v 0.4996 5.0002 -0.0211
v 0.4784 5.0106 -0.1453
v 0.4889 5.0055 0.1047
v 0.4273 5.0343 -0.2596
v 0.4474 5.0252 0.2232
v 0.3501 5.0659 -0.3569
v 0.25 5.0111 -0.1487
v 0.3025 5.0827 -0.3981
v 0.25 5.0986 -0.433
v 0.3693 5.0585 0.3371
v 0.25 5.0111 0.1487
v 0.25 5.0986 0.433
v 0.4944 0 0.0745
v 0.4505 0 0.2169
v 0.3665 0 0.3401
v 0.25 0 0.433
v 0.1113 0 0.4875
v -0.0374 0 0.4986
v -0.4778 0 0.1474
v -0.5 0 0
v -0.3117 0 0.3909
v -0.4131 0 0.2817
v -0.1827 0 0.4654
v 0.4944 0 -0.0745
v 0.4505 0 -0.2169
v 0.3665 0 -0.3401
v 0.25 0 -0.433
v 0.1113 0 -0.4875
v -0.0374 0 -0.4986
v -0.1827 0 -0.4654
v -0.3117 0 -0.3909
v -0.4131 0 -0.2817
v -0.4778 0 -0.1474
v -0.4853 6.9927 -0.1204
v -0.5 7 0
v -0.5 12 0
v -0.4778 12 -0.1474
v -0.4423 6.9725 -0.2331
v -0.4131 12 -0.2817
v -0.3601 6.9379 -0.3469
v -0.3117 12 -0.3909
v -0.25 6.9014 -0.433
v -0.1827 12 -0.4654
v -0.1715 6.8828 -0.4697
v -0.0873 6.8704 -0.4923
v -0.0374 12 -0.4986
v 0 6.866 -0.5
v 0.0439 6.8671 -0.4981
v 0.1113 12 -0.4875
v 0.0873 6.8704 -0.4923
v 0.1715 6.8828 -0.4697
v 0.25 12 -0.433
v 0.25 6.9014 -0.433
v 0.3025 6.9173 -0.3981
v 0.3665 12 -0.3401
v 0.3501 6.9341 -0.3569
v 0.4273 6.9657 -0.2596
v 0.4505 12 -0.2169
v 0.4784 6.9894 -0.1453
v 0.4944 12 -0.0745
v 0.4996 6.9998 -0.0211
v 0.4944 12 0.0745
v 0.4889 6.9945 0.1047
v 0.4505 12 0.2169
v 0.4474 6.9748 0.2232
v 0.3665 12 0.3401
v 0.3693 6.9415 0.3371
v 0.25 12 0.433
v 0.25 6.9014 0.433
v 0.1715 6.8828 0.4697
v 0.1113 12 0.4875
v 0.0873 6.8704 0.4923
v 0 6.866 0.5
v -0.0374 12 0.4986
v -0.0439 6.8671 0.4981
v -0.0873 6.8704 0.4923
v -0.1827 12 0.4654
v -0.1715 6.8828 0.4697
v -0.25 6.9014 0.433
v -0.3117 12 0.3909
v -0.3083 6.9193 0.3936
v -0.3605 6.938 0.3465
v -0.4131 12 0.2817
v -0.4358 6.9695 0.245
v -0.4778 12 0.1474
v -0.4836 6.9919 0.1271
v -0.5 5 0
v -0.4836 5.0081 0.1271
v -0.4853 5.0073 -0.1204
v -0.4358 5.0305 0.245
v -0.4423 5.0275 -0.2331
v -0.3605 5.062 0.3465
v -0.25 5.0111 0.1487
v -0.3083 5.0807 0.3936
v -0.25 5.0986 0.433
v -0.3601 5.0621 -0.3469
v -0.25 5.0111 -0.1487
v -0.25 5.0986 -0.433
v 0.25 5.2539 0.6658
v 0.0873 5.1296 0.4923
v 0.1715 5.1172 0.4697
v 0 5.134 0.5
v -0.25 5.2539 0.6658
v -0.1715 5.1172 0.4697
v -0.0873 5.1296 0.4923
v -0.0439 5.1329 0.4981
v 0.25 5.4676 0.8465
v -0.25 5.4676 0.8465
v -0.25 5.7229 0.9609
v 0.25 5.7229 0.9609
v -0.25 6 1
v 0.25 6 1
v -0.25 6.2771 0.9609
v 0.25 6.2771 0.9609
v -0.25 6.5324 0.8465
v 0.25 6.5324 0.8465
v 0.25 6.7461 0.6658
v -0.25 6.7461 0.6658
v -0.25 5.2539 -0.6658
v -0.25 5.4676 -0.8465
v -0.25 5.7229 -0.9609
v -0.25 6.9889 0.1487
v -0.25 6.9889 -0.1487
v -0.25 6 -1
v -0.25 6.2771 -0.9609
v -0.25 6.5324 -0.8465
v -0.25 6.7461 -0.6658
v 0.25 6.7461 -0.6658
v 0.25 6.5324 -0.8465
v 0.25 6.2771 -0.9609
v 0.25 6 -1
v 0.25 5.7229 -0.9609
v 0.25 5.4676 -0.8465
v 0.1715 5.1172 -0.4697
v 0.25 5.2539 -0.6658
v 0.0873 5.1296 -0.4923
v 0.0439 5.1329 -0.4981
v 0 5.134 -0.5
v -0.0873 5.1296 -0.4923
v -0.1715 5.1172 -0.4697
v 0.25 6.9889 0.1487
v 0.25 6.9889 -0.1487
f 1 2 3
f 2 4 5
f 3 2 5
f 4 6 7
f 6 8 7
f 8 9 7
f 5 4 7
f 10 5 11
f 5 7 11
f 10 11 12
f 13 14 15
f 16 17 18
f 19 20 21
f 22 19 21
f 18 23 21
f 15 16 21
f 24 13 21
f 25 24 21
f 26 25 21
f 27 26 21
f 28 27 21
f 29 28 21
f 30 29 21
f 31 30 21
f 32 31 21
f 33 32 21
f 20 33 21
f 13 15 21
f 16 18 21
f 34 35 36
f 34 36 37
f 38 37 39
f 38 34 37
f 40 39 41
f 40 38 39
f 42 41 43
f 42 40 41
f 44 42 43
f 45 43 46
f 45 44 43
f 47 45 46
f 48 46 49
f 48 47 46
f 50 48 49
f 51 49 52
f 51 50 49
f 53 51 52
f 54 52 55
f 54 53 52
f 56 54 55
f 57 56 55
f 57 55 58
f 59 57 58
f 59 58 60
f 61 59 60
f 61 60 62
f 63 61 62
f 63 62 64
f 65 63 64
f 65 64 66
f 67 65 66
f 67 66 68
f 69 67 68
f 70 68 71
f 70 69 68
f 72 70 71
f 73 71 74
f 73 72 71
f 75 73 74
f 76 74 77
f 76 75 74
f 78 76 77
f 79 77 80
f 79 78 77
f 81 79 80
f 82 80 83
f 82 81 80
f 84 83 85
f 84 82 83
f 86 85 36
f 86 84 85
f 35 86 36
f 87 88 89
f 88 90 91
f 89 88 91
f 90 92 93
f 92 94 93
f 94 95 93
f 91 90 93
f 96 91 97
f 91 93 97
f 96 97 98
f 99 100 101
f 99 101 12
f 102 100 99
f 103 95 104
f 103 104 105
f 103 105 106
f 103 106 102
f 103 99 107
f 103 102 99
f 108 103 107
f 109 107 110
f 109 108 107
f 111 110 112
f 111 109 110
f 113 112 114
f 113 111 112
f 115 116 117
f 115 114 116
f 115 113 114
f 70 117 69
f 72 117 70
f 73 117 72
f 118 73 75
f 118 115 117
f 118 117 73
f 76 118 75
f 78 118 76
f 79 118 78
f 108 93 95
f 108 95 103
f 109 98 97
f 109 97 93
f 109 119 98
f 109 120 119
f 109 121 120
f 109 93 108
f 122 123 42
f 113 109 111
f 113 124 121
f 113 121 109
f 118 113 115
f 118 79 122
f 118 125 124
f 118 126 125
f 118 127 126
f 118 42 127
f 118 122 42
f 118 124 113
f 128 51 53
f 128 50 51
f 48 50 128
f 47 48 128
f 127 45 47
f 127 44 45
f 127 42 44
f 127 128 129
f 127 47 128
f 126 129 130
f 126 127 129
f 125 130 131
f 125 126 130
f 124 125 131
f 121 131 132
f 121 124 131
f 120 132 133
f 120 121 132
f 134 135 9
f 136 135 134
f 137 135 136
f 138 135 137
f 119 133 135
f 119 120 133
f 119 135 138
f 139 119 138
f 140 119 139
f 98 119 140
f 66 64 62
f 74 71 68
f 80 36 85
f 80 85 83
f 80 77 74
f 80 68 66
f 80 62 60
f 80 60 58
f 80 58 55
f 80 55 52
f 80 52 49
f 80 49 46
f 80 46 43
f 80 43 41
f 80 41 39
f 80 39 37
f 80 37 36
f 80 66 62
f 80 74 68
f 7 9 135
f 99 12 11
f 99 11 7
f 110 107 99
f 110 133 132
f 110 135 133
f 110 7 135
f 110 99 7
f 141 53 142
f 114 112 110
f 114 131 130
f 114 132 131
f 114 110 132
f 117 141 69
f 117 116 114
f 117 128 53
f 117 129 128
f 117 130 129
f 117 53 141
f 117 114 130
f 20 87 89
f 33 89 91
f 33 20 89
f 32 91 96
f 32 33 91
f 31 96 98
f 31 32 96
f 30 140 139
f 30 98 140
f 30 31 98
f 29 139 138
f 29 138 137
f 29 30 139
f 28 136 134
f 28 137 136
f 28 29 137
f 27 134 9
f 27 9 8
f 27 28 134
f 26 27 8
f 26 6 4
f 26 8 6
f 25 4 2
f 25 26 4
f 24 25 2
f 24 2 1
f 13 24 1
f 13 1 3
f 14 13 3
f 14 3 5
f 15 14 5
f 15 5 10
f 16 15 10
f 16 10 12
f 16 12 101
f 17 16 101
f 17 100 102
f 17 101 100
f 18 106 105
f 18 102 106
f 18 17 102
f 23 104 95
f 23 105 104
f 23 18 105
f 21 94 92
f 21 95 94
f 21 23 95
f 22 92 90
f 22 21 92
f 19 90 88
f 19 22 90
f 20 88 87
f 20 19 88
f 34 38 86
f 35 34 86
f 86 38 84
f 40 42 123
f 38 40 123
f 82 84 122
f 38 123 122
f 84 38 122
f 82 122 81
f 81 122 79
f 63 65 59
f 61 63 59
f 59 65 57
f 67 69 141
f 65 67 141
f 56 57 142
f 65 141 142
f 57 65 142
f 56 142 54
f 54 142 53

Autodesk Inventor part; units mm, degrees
ref_plane "YZ Plane" through (0, 0, 0) normal (1, 0, 0) x (0, 1, 0)
ref_plane "XZ Plane" through (0, 0, 0) normal (0, 1, 0) x (-1, 0, 0)
sketch "Эскиз1" plane through (0, 0, 0) normal (0, 1, 0) x (-1, 0, 0)
  circle A0 centre (0, 0) radius 0.5
  dimension "d0" = 1
extrude "Выдавливание1" add sketch "Эскиз1" along normal blind 12
sketch "Эскиз2" plane through (0, 0, 0) normal (1, 0, 0) x (0, 1, 0)
  line L0 (0, 0) -> (6, 0) construction
  circle A0 centre (6, 0) radius 1
  dimension "d3" = 6
  dimension "d4" = 2
extrude "Выдавливание2" add sketch "Эскиз2" along normal mid plane 0.5
sketch "Эскиз3" plane through (-0.25, 0, 0) normal (-1, 0, 0) x (0, 0, 1)
  line L0 (0, 0) -> (0, 6) construction
  circle A0 centre (0, 6) radius 1
  dimension "d7" = 6
  dimension "d8" = 2
extrude "Выдавливание3" cut sketch "Эскиз3" along normal blind 1.25
sketch "Эскиз4" plane through (-0.25, 0, 0) normal (-1, 0, 0) x (0, 0, 1)
  point P0 (0, 0)
ref_plane "РабПлоскость1" through (0, 0, 0) normal (-1, 0, 0) x (0, 0, 1)
sketch "Эскиз6" plane through (0.25, 0, 0) normal (1, 0, 0) x (0, 0, -1)
  circle A0 centre (0, 6) radius 1
  point P0 (0, 0)
extrude "Выдавливание5" cut sketch "Эскиз6" along normal blind 3
properties part number "штырь"
